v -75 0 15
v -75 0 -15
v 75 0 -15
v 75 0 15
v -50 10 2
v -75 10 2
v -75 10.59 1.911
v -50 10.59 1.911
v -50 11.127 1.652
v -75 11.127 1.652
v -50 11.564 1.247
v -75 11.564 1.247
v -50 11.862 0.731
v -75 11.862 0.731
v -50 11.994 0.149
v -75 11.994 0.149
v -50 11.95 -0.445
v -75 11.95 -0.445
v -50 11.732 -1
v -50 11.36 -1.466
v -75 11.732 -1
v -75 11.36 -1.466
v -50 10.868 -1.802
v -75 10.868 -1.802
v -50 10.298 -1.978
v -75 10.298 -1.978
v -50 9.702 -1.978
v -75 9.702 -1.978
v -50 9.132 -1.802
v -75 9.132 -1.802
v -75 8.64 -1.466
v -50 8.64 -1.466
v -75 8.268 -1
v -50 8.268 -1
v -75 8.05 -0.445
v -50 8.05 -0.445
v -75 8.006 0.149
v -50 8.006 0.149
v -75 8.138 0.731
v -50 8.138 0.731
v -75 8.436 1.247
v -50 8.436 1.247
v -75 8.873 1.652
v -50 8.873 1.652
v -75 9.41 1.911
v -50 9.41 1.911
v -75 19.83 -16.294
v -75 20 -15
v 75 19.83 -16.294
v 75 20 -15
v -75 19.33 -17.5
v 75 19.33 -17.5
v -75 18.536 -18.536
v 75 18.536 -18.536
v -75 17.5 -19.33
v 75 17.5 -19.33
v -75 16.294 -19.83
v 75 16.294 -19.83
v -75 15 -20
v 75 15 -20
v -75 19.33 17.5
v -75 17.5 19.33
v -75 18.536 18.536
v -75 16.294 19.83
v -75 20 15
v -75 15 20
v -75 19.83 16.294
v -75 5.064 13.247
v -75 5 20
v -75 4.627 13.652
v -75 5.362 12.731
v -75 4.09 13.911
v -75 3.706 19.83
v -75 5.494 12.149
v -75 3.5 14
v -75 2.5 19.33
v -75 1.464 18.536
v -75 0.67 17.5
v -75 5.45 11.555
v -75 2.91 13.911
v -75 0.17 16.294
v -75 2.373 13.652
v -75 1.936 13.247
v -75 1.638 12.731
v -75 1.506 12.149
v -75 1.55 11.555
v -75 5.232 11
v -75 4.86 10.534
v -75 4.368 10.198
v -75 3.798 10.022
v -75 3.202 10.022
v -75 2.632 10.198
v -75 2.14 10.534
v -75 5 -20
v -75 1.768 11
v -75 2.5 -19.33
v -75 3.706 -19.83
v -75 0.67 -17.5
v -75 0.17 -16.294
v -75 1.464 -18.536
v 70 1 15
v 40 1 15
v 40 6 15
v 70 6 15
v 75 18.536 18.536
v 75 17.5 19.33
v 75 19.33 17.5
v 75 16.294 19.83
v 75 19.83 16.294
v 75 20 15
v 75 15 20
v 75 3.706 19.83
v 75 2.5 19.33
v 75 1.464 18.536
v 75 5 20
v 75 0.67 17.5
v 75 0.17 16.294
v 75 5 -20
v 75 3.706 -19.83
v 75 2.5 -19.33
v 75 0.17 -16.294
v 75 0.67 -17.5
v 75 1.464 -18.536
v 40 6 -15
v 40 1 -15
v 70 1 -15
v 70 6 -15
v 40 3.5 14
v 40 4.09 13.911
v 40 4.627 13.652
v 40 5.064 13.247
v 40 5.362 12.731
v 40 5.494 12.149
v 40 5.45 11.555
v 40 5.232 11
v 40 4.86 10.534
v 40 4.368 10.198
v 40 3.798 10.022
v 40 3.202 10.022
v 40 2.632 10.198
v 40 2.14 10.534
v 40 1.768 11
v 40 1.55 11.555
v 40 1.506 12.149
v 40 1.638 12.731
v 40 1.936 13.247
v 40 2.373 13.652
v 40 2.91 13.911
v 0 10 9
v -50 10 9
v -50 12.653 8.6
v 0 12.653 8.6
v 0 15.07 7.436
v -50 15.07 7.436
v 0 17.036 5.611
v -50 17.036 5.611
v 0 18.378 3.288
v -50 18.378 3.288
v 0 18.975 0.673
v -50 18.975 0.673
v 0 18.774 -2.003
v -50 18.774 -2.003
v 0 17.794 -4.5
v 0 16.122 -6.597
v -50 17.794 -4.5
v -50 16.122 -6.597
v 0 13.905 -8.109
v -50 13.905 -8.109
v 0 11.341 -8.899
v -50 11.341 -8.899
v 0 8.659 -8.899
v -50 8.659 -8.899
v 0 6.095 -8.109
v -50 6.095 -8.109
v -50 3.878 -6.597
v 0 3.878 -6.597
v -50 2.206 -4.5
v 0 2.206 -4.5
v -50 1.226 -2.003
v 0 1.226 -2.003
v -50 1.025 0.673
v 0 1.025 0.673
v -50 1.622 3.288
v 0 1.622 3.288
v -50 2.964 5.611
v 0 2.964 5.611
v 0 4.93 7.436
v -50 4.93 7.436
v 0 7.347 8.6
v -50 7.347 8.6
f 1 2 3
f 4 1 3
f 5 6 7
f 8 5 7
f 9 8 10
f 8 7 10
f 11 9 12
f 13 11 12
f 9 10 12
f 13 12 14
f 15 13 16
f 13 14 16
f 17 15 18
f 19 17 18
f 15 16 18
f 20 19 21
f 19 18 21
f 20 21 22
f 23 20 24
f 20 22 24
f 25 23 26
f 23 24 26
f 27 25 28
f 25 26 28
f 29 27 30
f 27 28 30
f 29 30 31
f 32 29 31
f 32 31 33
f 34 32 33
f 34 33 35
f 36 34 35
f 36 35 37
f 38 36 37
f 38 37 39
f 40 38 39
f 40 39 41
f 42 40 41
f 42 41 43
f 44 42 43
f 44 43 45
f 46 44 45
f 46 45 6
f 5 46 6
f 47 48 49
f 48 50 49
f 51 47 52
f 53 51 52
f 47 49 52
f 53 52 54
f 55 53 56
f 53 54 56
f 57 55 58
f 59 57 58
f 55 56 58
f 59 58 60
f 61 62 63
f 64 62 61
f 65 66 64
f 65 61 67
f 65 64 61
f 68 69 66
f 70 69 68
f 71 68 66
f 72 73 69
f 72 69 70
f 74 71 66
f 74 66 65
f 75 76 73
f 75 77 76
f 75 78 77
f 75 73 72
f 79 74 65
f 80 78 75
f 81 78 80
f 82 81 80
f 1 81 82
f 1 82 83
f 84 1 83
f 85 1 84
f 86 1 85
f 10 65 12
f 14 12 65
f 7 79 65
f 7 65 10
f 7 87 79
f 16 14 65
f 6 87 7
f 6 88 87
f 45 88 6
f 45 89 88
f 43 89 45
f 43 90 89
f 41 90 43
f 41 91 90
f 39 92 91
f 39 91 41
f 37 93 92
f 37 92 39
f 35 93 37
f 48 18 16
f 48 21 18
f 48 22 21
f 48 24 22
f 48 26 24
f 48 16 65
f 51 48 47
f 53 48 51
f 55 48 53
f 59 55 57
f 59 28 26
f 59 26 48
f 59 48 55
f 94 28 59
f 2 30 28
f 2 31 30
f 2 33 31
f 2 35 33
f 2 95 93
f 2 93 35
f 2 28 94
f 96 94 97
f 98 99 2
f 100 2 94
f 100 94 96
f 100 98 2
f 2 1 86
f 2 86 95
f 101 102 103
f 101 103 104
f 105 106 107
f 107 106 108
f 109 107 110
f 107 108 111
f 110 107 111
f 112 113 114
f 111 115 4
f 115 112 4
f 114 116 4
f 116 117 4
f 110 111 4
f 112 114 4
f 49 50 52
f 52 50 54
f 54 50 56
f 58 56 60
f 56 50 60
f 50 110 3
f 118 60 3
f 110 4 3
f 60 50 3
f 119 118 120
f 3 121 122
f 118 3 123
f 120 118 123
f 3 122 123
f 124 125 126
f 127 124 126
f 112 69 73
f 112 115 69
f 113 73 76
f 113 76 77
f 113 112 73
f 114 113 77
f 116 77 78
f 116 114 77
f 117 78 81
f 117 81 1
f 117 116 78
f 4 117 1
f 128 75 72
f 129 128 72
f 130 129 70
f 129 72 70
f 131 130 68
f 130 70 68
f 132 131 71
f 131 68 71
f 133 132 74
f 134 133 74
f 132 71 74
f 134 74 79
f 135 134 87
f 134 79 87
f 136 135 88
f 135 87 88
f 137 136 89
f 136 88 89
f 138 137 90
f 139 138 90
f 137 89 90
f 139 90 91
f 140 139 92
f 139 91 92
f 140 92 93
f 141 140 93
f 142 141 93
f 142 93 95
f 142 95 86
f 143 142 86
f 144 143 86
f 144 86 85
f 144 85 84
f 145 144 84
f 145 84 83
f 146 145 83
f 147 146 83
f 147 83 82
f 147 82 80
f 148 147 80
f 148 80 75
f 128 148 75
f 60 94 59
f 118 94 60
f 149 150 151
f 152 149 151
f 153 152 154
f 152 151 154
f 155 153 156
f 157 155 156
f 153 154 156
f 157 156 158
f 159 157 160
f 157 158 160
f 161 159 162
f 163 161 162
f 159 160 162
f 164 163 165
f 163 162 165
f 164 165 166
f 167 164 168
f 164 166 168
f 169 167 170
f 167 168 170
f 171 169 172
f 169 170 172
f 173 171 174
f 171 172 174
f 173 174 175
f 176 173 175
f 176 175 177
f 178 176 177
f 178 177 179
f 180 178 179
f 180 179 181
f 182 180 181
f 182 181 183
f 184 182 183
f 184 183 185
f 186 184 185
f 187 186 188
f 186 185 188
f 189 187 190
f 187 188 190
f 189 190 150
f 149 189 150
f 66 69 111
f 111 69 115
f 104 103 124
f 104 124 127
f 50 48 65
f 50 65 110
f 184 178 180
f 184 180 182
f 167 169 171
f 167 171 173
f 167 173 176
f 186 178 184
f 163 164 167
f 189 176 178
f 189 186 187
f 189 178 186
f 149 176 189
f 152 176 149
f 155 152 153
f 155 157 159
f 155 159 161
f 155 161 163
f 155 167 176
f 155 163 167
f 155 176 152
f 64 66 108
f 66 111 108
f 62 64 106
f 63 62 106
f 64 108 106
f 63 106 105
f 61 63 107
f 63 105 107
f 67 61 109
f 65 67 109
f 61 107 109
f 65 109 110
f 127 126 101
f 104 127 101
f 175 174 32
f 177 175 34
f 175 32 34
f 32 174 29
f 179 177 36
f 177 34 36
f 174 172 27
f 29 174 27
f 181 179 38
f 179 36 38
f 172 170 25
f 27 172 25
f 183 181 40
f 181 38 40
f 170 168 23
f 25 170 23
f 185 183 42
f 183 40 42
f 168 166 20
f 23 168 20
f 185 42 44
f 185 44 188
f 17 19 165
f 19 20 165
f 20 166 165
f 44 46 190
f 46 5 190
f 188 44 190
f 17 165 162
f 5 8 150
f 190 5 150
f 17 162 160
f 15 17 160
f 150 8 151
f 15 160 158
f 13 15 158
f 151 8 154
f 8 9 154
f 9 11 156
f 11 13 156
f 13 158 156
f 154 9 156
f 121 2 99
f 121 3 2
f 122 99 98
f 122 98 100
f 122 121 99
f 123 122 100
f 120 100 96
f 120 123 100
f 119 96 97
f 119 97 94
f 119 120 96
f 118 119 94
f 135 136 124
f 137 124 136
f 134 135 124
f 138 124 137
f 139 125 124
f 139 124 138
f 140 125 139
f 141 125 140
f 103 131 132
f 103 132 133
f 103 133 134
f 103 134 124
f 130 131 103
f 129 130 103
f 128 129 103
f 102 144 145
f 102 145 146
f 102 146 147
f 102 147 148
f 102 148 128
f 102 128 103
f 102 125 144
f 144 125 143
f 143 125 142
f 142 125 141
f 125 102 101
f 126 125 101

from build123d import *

# Parameters (mm, degrees)
SKETCH1_W           = 150
SKETCH1_H           = 40
BOSS_EXTRUDE1_DEPTH = 20
CUT_EXTRUDE1_START  = -1
SKETCH2_W           = 30
SKETCH2_H           = 30
CUT_EXTRUDE1_DEPTH  = 5
SKETCH7_R           = 2
CUT_EXTRUDE3_DEPTH  = 140
FILLET1_R           = 5
CUT_EXTRUDE5_START  = -25
SKETCH9_R           = 9
CUT_EXTRUDE5_DEPTH  = 50
SKETCH8_R           = 2
CUT_EXTRUDE4_DEPTH  = 62


with BuildPart() as part:
    # Sketch1 → Boss-Extrude1 (new body)
    with BuildSketch(Plane(origin=(0, 0, 0), x_dir=(1, 0, 0), z_dir=(0, 1, 0))):
        Rectangle(SKETCH1_W, SKETCH1_H)
    extrude(amount=BOSS_EXTRUDE1_DEPTH)

    # Sketch2 → Cut-Extrude1 (cut)
    with BuildSketch(Plane.XZ.offset(CUT_EXTRUDE1_START)):
        with Locations((55, 0)):
            Rectangle(SKETCH2_W, SKETCH2_H)
    extrude(amount=-CUT_EXTRUDE1_DEPTH, mode=Mode.SUBTRACT)

    # Sketch7 → Cut-Extrude3 (cut)
    with BuildSketch(Plane.ZY.offset(75)):
        with Locations((12, 3.5)):
            Circle(SKETCH7_R)
    extrude(amount=-CUT_EXTRUDE3_DEPTH, mode=Mode.SUBTRACT)

    # Fillet1
    fillet1_edges = [part.edges().sort_by_distance(p)[0] for p in [
        (0, 20, -20),
        (0, 0, -20),
        (0, 0, 20),
        (0, 20, 20),
    ]]
    fillet(fillet1_edges, radius=FILLET1_R)

    # Sketch9 → Cut-Extrude5 (cut)
    with BuildSketch(Plane.ZY.offset(75).offset(CUT_EXTRUDE5_START)):
        with Locations((0, 10)):
            Circle(SKETCH9_R)
    extrude(amount=-CUT_EXTRUDE5_DEPTH, mode=Mode.SUBTRACT)

    # Sketch8 → Cut-Extrude4 (cut)
    with BuildSketch(Plane.ZY.offset(75)):
        with Locations((0, 10)):
            Circle(SKETCH8_R)
    extrude(amount=-CUT_EXTRUDE4_DEPTH, mode=Mode.SUBTRACT)


solid = part.part
